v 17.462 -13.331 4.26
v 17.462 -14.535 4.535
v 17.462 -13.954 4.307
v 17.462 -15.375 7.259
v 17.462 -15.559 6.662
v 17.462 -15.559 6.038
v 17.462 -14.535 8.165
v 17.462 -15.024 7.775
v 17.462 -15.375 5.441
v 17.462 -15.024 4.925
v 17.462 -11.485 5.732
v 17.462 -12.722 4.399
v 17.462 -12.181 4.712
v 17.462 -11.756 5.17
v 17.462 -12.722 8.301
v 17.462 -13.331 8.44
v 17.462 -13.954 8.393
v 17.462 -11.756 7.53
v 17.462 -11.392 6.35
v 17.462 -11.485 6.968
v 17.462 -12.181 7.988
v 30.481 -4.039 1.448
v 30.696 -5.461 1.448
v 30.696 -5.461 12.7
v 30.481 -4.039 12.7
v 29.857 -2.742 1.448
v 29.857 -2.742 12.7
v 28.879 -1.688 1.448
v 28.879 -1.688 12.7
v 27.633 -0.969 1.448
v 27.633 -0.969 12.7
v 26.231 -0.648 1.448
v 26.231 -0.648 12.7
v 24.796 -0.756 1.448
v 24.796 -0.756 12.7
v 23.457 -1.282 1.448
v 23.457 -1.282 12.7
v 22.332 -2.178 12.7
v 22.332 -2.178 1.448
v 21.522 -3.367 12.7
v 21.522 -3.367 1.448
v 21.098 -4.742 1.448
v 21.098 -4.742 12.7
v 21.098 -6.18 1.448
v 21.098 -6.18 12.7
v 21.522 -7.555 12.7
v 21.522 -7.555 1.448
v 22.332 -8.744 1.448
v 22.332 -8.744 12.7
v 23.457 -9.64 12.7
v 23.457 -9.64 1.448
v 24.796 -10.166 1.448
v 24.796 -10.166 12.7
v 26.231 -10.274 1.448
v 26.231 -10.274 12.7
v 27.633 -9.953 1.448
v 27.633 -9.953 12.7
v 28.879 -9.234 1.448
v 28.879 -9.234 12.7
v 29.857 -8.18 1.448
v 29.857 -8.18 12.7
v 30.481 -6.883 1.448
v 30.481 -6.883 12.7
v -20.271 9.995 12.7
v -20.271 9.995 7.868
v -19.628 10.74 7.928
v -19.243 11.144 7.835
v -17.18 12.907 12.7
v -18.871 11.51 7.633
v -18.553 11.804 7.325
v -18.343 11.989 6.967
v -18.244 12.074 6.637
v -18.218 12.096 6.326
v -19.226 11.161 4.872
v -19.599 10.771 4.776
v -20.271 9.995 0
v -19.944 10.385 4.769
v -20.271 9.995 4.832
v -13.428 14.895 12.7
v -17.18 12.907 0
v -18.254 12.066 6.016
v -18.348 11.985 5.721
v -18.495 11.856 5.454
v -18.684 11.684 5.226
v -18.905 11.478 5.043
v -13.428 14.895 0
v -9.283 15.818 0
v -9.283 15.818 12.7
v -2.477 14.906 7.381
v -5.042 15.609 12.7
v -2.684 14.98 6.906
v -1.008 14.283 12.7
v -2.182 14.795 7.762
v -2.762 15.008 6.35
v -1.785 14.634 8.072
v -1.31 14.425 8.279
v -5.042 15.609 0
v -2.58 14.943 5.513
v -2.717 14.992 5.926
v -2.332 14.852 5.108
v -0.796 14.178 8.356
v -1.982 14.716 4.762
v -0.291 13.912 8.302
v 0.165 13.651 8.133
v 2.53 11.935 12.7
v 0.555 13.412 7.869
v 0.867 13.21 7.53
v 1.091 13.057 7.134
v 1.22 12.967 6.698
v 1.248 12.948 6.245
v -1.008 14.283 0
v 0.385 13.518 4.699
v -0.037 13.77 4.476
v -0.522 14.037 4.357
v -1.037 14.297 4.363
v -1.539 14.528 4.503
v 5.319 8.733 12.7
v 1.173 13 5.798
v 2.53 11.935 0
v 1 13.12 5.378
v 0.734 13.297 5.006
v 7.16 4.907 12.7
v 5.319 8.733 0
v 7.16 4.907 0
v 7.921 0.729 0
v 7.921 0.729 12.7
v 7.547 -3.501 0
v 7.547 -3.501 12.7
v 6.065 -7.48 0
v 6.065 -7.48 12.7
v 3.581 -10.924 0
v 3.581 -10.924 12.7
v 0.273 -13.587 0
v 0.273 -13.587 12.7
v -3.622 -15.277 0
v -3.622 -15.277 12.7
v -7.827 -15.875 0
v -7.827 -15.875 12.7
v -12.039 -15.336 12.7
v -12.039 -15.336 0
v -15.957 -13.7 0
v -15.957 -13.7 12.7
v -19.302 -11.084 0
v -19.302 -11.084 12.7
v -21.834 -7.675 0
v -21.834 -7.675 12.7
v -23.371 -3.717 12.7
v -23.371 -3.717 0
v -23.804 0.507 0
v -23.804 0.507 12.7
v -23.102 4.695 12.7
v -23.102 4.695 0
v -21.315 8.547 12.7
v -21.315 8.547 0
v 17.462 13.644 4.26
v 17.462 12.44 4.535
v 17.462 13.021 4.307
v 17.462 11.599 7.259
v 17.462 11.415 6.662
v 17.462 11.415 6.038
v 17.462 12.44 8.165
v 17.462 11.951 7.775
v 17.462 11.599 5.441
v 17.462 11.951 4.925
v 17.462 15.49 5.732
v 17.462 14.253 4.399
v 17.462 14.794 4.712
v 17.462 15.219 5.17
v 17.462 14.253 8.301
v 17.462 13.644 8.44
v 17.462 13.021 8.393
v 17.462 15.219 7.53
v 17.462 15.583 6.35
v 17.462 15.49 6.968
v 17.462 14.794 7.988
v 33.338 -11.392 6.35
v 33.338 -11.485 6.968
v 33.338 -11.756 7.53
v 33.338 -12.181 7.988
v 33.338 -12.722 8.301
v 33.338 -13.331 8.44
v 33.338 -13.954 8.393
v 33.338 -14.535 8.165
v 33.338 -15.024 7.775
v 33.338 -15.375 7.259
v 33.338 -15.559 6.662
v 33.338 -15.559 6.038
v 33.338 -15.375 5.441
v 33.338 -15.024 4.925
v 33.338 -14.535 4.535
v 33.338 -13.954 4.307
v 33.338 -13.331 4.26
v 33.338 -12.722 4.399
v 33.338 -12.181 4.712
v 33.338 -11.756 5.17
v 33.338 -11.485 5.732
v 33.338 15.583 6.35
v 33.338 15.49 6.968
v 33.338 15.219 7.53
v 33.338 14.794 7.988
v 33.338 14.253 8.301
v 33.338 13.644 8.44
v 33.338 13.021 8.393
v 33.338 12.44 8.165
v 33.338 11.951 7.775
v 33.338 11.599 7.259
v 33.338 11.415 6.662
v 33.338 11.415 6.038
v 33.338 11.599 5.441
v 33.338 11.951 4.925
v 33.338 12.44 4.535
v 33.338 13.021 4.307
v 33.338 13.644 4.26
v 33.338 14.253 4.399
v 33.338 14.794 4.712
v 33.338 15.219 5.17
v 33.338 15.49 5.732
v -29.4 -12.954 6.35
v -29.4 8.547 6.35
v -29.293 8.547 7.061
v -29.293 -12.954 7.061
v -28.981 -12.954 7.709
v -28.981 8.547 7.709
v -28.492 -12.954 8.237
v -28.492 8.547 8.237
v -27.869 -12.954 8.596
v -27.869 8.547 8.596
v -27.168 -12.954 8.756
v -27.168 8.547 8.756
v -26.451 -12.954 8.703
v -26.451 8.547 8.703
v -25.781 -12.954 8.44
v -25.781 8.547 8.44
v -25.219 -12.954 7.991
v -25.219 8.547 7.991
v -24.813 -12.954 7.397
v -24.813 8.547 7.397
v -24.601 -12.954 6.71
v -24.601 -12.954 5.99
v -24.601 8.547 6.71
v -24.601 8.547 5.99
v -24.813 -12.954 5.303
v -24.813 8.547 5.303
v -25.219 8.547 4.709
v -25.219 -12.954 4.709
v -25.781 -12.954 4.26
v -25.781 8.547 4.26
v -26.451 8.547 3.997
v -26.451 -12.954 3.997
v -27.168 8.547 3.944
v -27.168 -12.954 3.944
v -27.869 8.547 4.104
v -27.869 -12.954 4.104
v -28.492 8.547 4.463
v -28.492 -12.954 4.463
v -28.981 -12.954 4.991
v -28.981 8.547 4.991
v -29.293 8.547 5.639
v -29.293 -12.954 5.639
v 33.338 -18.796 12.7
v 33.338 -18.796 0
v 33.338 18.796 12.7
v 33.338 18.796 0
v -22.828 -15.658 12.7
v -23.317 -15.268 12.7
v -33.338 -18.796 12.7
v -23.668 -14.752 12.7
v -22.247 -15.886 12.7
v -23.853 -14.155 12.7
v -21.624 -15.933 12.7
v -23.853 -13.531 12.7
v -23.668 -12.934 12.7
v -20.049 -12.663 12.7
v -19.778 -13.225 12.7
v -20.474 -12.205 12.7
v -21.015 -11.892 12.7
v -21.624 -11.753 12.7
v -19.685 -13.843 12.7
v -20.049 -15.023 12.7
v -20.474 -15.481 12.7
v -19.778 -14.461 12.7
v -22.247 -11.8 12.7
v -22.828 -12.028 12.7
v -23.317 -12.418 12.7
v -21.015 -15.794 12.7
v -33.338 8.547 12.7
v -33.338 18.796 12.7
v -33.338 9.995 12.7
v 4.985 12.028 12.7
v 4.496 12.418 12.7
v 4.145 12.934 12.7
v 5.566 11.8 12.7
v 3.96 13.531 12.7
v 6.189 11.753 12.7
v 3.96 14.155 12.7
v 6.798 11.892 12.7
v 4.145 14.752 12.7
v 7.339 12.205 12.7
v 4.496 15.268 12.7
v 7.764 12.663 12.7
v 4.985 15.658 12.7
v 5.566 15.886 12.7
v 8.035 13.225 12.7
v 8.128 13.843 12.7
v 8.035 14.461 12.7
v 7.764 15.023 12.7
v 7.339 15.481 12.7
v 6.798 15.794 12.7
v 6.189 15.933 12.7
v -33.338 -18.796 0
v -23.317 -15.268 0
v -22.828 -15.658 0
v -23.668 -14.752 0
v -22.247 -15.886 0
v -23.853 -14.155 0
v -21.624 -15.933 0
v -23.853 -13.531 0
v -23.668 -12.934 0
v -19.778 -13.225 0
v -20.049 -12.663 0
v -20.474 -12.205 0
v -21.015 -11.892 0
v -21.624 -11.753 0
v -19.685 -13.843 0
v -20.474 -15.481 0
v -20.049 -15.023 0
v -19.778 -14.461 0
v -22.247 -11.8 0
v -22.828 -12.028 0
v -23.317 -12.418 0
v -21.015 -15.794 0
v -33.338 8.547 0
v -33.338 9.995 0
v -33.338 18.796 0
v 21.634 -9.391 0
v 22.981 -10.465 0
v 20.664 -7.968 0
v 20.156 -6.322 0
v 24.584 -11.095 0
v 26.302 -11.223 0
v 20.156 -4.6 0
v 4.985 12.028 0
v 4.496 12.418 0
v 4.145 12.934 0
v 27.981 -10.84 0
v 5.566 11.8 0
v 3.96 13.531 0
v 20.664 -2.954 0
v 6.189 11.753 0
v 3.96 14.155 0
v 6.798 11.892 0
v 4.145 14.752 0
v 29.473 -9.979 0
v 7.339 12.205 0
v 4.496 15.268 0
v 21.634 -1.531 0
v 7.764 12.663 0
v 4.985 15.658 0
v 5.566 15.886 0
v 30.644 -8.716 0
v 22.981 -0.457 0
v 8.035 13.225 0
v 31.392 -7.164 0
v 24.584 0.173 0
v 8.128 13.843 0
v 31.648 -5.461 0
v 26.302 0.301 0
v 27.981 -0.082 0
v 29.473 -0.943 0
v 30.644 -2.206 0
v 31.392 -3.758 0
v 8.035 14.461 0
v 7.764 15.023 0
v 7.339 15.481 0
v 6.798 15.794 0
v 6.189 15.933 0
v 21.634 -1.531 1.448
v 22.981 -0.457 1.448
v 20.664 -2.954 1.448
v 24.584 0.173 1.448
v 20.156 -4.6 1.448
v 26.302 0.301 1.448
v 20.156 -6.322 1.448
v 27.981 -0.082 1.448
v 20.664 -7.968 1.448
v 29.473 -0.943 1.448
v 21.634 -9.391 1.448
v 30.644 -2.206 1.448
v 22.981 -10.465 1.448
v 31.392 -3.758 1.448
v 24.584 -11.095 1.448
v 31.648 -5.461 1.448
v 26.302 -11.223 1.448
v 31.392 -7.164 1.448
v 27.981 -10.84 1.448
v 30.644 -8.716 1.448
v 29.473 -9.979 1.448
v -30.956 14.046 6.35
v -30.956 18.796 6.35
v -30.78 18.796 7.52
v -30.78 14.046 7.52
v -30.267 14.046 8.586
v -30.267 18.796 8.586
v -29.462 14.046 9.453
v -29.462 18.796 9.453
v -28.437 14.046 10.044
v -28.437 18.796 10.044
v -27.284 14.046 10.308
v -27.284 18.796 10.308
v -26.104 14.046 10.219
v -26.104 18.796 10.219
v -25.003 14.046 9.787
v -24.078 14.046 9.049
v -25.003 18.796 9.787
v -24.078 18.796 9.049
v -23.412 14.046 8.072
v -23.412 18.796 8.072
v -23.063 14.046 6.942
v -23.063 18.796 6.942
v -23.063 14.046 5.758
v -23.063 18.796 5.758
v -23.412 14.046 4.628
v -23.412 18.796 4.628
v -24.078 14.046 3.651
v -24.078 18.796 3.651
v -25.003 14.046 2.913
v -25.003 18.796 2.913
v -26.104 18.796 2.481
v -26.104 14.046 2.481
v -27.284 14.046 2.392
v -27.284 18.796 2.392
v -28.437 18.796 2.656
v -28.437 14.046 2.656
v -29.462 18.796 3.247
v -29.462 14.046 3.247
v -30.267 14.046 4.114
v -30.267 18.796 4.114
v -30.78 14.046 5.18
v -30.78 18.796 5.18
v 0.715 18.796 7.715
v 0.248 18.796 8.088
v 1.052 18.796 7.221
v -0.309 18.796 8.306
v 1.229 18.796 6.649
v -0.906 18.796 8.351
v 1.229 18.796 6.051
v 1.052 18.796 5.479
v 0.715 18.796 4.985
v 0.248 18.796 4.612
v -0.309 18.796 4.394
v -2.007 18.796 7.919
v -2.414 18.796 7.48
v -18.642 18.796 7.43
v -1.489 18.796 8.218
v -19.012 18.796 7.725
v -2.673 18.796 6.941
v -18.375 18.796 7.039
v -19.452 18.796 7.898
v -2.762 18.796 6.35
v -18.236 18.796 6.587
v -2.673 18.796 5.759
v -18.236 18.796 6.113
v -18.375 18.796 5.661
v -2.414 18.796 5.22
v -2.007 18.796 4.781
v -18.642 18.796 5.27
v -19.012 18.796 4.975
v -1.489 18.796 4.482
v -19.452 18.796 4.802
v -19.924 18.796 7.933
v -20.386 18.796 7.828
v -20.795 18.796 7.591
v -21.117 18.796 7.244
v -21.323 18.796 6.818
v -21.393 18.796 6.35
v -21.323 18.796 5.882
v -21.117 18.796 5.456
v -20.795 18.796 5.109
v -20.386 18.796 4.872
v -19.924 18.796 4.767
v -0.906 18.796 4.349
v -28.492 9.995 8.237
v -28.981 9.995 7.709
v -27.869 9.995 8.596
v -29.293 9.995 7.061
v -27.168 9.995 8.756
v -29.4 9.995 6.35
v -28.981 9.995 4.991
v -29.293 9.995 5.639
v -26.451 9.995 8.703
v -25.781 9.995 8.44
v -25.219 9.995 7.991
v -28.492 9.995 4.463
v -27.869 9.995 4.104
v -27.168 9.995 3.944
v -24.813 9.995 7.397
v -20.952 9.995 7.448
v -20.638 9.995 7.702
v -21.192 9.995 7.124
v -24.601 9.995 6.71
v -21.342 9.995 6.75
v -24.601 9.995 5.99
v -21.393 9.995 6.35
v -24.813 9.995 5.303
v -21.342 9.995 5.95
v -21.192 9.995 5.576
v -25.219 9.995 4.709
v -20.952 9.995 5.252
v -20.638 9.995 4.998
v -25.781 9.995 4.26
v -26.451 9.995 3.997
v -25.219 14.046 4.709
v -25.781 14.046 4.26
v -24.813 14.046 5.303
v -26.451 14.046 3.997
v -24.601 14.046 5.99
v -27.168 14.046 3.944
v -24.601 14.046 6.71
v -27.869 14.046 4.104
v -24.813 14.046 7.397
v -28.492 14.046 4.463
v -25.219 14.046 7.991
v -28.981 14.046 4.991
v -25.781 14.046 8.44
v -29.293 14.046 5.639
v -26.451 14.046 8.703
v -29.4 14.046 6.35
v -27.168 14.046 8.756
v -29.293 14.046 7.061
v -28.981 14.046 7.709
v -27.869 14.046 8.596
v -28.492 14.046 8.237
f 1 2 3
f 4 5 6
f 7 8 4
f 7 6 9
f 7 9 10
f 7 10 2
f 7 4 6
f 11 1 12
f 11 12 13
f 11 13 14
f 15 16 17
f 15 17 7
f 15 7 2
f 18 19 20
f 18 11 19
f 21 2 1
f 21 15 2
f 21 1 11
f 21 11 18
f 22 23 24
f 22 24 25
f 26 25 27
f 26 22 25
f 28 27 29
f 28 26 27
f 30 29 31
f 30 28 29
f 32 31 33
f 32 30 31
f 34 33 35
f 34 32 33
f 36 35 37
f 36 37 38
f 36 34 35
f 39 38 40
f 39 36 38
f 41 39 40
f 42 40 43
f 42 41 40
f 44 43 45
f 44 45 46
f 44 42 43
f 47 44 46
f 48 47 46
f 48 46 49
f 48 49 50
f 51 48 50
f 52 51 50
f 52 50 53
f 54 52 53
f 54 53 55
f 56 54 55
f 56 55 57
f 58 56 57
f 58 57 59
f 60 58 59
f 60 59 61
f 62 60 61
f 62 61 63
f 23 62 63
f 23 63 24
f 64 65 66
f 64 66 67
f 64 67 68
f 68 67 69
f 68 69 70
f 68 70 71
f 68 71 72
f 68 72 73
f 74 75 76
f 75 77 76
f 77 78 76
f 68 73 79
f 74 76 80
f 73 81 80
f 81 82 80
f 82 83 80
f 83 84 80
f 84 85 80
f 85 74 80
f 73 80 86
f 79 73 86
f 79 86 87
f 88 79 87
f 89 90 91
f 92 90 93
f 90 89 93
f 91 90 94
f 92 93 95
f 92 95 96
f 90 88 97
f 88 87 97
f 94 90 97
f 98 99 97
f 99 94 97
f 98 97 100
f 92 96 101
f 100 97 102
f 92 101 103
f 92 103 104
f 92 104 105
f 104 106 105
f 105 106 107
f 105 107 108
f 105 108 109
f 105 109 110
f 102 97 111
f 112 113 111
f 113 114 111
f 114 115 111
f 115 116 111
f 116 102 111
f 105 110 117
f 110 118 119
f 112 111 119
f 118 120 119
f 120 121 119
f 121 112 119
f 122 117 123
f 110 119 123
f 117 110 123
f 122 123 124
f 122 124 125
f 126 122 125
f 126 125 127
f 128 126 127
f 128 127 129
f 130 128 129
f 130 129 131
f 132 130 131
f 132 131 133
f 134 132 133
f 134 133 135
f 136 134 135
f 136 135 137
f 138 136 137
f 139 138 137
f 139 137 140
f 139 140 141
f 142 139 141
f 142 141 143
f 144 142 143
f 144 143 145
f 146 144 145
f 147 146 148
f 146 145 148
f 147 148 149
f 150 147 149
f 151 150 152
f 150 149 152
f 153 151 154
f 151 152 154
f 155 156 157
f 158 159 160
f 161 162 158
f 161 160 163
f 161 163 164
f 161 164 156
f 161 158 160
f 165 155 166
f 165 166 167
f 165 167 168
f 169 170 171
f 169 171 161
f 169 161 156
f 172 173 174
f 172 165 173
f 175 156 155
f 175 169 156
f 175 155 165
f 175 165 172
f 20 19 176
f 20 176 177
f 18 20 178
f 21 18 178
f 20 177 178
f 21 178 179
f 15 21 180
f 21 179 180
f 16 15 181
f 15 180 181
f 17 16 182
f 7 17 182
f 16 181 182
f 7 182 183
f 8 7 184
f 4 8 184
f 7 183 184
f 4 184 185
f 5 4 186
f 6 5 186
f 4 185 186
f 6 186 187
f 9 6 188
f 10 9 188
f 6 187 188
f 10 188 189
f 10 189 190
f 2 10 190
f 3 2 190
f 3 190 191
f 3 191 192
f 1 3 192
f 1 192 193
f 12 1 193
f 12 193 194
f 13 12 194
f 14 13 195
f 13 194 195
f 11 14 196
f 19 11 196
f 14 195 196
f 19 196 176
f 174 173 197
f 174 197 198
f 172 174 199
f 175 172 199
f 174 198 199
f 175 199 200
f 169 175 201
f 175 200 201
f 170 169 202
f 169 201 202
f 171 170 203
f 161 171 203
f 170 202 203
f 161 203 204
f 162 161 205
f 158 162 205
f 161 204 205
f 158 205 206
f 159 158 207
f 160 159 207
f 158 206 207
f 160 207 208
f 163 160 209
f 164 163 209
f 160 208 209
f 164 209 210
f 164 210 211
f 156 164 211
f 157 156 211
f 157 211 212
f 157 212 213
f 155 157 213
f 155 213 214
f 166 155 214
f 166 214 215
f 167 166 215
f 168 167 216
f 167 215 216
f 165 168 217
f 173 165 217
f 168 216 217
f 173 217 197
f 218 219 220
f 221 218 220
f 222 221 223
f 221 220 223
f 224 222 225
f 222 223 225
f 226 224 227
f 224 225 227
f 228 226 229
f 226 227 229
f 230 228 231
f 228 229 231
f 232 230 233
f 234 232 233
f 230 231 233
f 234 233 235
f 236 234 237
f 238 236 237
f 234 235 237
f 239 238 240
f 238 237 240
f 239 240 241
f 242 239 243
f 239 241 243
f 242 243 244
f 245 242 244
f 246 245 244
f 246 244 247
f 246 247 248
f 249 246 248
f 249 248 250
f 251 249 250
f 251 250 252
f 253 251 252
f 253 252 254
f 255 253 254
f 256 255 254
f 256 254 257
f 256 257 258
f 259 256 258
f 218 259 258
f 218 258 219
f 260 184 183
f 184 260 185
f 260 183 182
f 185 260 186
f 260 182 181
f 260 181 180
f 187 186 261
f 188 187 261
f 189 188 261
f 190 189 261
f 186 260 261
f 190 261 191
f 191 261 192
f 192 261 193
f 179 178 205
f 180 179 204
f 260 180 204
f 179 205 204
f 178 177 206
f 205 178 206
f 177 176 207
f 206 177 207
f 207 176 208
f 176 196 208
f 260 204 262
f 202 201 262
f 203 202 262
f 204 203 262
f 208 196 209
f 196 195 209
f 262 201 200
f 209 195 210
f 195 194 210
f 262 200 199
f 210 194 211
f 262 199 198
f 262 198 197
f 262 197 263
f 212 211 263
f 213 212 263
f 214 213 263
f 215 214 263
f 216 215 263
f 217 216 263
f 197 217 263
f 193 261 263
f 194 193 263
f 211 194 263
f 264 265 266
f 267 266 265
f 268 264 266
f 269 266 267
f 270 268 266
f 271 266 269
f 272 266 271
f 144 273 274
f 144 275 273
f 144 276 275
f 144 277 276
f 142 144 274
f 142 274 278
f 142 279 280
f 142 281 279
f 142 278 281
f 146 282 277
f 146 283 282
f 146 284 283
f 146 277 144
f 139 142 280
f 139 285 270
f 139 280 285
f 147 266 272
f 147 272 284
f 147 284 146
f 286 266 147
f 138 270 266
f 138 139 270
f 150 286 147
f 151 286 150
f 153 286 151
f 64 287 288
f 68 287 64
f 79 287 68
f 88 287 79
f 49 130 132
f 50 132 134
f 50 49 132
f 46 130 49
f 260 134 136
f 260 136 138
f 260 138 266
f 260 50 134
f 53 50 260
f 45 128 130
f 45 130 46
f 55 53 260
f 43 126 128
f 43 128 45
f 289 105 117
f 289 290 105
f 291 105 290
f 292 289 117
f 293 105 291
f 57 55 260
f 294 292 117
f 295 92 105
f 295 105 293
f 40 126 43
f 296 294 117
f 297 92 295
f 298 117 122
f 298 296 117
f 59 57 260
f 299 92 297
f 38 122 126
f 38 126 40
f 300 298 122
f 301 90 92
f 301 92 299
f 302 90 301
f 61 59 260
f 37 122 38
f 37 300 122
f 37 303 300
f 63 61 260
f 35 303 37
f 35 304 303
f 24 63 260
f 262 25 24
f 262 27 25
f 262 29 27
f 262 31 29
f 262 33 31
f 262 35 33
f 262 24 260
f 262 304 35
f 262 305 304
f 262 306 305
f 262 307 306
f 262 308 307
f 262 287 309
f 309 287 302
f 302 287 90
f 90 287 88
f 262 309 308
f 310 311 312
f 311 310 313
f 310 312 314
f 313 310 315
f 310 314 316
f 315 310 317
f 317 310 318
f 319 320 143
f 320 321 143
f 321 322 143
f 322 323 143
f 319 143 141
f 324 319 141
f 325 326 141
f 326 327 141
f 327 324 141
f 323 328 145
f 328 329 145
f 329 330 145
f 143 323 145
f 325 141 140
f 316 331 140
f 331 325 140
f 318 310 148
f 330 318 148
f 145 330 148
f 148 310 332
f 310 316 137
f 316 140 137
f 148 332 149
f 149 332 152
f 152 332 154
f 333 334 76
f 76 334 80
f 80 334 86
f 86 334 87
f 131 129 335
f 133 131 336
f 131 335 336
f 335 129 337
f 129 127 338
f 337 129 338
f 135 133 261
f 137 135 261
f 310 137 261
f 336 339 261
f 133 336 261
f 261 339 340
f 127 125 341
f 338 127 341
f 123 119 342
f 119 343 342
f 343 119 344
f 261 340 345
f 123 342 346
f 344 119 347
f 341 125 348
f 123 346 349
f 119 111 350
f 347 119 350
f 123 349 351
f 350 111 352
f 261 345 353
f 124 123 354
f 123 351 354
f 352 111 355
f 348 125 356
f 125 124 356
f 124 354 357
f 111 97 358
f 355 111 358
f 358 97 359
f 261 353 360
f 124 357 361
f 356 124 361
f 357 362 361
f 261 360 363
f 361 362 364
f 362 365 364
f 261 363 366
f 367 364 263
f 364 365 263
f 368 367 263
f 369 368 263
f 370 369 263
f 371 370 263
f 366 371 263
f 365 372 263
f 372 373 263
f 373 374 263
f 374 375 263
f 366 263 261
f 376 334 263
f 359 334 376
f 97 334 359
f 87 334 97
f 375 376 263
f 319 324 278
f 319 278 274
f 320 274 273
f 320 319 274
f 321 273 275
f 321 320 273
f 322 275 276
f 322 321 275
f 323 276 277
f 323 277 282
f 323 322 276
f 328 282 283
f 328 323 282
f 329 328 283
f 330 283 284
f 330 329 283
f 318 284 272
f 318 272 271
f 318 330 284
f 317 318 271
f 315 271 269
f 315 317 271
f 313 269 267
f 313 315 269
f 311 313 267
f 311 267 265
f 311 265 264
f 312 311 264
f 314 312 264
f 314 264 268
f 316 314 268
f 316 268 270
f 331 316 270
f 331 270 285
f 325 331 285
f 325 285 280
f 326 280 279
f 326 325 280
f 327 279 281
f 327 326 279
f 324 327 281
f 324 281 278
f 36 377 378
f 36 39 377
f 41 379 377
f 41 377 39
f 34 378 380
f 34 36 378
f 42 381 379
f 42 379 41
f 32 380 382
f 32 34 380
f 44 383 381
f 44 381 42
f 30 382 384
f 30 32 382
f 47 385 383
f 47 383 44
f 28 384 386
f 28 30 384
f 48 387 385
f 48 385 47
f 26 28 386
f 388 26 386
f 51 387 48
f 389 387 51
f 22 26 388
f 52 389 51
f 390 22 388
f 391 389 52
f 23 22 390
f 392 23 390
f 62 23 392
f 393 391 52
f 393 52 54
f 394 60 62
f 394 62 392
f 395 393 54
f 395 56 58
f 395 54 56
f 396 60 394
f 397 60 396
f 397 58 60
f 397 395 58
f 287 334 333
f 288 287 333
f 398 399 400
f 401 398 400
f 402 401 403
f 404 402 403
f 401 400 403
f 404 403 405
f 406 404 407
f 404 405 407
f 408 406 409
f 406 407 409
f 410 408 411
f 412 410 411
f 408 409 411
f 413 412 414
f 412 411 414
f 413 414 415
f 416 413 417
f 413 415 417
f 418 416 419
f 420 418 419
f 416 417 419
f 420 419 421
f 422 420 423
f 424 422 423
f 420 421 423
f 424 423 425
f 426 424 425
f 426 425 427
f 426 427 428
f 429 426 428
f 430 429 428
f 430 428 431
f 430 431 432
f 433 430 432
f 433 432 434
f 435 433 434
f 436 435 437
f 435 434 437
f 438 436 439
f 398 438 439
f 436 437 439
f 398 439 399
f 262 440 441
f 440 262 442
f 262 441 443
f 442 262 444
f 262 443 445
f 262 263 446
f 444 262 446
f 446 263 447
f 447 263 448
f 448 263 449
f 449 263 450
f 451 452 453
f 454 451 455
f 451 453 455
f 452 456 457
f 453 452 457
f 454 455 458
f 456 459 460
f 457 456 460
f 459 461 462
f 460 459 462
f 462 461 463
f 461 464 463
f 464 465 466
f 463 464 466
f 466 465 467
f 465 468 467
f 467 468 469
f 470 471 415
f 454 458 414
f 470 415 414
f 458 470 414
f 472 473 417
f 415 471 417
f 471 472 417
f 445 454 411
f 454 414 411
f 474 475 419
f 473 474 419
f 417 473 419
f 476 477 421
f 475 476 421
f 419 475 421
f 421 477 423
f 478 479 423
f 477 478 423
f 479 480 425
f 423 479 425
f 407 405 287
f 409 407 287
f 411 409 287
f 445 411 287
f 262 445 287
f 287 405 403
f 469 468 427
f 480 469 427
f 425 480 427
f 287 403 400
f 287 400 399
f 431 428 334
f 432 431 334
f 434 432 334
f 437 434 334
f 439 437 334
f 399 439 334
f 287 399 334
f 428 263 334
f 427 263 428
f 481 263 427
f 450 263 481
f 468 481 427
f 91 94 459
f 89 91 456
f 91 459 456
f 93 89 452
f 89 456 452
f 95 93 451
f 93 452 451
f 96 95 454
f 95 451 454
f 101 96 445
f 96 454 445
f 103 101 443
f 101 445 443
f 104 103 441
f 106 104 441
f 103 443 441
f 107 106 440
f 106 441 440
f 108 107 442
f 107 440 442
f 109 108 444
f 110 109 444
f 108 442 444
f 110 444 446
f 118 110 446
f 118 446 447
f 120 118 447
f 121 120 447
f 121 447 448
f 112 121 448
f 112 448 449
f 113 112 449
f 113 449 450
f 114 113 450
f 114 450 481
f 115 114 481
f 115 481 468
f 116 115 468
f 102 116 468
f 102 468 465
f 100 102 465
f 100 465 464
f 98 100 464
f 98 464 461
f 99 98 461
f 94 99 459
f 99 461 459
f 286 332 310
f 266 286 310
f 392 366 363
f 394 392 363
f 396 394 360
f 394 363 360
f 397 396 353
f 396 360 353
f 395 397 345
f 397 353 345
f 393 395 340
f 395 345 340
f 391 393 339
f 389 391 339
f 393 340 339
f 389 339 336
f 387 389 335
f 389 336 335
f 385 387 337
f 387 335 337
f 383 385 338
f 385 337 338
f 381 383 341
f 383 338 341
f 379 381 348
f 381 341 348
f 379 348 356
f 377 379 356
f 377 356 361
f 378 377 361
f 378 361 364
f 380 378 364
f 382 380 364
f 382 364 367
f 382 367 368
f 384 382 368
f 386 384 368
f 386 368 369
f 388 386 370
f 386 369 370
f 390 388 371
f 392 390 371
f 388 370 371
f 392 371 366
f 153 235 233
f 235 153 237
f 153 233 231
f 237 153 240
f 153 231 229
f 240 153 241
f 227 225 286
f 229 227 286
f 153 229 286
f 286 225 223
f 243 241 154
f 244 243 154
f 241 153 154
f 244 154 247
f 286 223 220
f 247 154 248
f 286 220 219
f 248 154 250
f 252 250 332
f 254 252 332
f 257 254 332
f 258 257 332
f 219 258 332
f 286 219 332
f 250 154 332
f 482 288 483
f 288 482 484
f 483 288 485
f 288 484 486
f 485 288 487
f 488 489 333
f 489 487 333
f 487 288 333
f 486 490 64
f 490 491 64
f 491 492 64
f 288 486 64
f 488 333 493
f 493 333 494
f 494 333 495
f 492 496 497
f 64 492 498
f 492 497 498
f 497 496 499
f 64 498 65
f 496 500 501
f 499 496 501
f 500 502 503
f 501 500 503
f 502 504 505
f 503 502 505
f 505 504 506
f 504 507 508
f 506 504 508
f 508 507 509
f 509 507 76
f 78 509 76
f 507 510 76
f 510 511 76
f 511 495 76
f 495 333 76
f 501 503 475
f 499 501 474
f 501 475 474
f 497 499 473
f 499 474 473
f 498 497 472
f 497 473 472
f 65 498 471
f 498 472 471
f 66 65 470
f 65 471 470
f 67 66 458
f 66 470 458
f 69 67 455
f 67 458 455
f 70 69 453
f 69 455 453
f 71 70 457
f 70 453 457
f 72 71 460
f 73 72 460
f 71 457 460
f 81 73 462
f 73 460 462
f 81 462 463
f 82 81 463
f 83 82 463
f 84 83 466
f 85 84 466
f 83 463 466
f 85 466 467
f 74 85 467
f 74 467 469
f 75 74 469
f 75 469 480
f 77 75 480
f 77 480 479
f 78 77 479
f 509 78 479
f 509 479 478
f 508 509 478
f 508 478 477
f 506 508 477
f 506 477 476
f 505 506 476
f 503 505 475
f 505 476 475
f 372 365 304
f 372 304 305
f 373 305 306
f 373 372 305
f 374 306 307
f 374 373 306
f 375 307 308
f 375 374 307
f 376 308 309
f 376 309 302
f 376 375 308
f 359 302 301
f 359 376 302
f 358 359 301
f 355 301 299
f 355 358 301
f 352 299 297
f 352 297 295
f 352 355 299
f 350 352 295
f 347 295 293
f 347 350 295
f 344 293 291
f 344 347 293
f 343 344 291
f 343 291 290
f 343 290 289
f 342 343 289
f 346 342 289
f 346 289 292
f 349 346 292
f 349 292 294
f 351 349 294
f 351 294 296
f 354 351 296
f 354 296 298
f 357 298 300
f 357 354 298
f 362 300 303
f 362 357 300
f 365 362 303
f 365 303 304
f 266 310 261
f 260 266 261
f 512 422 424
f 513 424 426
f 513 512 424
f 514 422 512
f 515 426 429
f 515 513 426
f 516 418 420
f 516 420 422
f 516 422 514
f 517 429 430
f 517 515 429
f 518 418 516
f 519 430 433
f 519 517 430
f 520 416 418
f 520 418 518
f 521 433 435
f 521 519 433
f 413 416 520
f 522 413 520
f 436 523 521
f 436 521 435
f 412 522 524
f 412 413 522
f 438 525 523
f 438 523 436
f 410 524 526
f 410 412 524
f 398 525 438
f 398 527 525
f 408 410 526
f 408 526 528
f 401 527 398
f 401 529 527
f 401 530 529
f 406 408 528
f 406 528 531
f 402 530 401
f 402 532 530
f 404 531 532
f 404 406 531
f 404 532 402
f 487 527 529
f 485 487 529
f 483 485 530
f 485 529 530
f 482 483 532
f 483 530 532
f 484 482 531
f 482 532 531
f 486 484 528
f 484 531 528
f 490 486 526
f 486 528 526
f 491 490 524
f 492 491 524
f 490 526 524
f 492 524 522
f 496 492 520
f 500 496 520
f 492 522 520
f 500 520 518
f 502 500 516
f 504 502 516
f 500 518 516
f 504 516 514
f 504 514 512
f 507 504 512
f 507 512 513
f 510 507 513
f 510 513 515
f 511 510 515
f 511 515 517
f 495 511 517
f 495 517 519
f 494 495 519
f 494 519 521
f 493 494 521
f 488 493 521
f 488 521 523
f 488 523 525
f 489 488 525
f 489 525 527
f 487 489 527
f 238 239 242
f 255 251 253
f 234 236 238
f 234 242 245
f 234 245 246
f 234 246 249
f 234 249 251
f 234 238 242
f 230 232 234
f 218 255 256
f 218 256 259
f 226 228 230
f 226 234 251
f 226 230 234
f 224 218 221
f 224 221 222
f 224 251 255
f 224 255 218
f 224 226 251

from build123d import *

# Parameters (mm, degrees)
F0_R      = 2.0955
F0_R_2    = 4.826
F1_DEPTH  = 12.7
F2_R      = 2.0955
F3_DEPTH  = 15.875
F4_R      = 5.7785
F5_DEPTH  = 1.4478
F6_R      = 2.413
F7_DEPTH  = 31.75
F8_R      = 3.96875
F9_DEPTH  = 4.7498
F10_R     = 1.5875
F10_R_2   = 2.0066
F11_DEPTH = 9.525


with BuildPart() as f1:
    # F0 (on Top) → F1 (new body)
    with BuildSketch(Plane.XY):
        with BuildLine():
            Line((33.3375, -18.796), (33.3375, 18.796))
            Line((33.3375, 18.796), (-33.3375, 18.796))
            Line((-33.3375, 18.796), (-33.3375, 9.9949))
            Line((-33.3375, 9.9949), (-20.271096, 9.9949))
            ThreePointArc((-20.271096, 9.9949), (4.938511, -9.285687), (-21.315194, 8.5471))
            Line((-21.315194, 8.5471), (-33.3375, 8.5471))
            Line((-33.3375, 8.5471), (-33.3375, -18.796))
            Line((-33.3375, -18.796), (33.3375, -18.796))
        make_face()
        with Locations((-21.7805, -13.843)):
            Circle(F0_R, mode=Mode.SUBTRACT)
        with Locations((25.8699, -5.461)):
            Circle(F0_R_2, mode=Mode.SUBTRACT)
        with Locations((6.0325, 13.843)):
            Circle(F0_R, mode=Mode.SUBTRACT)
    extrude(amount=F1_DEPTH)

    # F2 (on face) → F3 (cut)
    with BuildSketch(Plane.YZ.offset(33.3375)):
        with Locations((-13.4874, 6.35)):
            Circle(F2_R)
        with Locations((13.4874, 6.35)):
            Circle(F2_R)
    extrude(amount=-F3_DEPTH, mode=Mode.SUBTRACT)

    # F4 (on face) → F5 (cut)
    with BuildSketch(Plane(origin=(0, 0, 0), x_dir=(1, 0, 0), z_dir=(0, 0, -1))):
        with Locations((25.8699, 5.461)):
            Circle(F4_R)
    extrude(amount=-F5_DEPTH, mode=Mode.SUBTRACT)

    # F6 (on face) → F7 (cut)
    with BuildSketch(Plane(origin=(0, 18.796, 0), x_dir=(-1, 0, 0), z_dir=(0, 1, 0))):
        with Locations((26.9875, 6.35)):
            Circle(F6_R)
    extrude(amount=-F7_DEPTH, mode=Mode.SUBTRACT)

    # F8 (on face) → F9 (cut)
    with BuildSketch(Plane(origin=(0, 18.796, 0), x_dir=(-1, 0, 0), z_dir=(0, 1, 0))):
        with Locations((26.9875, 6.35)):
            Circle(F8_R)
    extrude(amount=-F9_DEPTH, mode=Mode.SUBTRACT)

    # F10 (on face) → F11 (cut)
    with BuildSketch(Plane(origin=(0, 18.796, 0), x_dir=(-1, 0, 0), z_dir=(0, 1, 0))):
        with Locations((19.80565, 6.35)):
            Circle(F10_R)
        with Locations((0.75565, 6.35)):
            Circle(F10_R_2)
    extrude(amount=-F11_DEPTH, mode=Mode.SUBTRACT)


solid = f1.part
